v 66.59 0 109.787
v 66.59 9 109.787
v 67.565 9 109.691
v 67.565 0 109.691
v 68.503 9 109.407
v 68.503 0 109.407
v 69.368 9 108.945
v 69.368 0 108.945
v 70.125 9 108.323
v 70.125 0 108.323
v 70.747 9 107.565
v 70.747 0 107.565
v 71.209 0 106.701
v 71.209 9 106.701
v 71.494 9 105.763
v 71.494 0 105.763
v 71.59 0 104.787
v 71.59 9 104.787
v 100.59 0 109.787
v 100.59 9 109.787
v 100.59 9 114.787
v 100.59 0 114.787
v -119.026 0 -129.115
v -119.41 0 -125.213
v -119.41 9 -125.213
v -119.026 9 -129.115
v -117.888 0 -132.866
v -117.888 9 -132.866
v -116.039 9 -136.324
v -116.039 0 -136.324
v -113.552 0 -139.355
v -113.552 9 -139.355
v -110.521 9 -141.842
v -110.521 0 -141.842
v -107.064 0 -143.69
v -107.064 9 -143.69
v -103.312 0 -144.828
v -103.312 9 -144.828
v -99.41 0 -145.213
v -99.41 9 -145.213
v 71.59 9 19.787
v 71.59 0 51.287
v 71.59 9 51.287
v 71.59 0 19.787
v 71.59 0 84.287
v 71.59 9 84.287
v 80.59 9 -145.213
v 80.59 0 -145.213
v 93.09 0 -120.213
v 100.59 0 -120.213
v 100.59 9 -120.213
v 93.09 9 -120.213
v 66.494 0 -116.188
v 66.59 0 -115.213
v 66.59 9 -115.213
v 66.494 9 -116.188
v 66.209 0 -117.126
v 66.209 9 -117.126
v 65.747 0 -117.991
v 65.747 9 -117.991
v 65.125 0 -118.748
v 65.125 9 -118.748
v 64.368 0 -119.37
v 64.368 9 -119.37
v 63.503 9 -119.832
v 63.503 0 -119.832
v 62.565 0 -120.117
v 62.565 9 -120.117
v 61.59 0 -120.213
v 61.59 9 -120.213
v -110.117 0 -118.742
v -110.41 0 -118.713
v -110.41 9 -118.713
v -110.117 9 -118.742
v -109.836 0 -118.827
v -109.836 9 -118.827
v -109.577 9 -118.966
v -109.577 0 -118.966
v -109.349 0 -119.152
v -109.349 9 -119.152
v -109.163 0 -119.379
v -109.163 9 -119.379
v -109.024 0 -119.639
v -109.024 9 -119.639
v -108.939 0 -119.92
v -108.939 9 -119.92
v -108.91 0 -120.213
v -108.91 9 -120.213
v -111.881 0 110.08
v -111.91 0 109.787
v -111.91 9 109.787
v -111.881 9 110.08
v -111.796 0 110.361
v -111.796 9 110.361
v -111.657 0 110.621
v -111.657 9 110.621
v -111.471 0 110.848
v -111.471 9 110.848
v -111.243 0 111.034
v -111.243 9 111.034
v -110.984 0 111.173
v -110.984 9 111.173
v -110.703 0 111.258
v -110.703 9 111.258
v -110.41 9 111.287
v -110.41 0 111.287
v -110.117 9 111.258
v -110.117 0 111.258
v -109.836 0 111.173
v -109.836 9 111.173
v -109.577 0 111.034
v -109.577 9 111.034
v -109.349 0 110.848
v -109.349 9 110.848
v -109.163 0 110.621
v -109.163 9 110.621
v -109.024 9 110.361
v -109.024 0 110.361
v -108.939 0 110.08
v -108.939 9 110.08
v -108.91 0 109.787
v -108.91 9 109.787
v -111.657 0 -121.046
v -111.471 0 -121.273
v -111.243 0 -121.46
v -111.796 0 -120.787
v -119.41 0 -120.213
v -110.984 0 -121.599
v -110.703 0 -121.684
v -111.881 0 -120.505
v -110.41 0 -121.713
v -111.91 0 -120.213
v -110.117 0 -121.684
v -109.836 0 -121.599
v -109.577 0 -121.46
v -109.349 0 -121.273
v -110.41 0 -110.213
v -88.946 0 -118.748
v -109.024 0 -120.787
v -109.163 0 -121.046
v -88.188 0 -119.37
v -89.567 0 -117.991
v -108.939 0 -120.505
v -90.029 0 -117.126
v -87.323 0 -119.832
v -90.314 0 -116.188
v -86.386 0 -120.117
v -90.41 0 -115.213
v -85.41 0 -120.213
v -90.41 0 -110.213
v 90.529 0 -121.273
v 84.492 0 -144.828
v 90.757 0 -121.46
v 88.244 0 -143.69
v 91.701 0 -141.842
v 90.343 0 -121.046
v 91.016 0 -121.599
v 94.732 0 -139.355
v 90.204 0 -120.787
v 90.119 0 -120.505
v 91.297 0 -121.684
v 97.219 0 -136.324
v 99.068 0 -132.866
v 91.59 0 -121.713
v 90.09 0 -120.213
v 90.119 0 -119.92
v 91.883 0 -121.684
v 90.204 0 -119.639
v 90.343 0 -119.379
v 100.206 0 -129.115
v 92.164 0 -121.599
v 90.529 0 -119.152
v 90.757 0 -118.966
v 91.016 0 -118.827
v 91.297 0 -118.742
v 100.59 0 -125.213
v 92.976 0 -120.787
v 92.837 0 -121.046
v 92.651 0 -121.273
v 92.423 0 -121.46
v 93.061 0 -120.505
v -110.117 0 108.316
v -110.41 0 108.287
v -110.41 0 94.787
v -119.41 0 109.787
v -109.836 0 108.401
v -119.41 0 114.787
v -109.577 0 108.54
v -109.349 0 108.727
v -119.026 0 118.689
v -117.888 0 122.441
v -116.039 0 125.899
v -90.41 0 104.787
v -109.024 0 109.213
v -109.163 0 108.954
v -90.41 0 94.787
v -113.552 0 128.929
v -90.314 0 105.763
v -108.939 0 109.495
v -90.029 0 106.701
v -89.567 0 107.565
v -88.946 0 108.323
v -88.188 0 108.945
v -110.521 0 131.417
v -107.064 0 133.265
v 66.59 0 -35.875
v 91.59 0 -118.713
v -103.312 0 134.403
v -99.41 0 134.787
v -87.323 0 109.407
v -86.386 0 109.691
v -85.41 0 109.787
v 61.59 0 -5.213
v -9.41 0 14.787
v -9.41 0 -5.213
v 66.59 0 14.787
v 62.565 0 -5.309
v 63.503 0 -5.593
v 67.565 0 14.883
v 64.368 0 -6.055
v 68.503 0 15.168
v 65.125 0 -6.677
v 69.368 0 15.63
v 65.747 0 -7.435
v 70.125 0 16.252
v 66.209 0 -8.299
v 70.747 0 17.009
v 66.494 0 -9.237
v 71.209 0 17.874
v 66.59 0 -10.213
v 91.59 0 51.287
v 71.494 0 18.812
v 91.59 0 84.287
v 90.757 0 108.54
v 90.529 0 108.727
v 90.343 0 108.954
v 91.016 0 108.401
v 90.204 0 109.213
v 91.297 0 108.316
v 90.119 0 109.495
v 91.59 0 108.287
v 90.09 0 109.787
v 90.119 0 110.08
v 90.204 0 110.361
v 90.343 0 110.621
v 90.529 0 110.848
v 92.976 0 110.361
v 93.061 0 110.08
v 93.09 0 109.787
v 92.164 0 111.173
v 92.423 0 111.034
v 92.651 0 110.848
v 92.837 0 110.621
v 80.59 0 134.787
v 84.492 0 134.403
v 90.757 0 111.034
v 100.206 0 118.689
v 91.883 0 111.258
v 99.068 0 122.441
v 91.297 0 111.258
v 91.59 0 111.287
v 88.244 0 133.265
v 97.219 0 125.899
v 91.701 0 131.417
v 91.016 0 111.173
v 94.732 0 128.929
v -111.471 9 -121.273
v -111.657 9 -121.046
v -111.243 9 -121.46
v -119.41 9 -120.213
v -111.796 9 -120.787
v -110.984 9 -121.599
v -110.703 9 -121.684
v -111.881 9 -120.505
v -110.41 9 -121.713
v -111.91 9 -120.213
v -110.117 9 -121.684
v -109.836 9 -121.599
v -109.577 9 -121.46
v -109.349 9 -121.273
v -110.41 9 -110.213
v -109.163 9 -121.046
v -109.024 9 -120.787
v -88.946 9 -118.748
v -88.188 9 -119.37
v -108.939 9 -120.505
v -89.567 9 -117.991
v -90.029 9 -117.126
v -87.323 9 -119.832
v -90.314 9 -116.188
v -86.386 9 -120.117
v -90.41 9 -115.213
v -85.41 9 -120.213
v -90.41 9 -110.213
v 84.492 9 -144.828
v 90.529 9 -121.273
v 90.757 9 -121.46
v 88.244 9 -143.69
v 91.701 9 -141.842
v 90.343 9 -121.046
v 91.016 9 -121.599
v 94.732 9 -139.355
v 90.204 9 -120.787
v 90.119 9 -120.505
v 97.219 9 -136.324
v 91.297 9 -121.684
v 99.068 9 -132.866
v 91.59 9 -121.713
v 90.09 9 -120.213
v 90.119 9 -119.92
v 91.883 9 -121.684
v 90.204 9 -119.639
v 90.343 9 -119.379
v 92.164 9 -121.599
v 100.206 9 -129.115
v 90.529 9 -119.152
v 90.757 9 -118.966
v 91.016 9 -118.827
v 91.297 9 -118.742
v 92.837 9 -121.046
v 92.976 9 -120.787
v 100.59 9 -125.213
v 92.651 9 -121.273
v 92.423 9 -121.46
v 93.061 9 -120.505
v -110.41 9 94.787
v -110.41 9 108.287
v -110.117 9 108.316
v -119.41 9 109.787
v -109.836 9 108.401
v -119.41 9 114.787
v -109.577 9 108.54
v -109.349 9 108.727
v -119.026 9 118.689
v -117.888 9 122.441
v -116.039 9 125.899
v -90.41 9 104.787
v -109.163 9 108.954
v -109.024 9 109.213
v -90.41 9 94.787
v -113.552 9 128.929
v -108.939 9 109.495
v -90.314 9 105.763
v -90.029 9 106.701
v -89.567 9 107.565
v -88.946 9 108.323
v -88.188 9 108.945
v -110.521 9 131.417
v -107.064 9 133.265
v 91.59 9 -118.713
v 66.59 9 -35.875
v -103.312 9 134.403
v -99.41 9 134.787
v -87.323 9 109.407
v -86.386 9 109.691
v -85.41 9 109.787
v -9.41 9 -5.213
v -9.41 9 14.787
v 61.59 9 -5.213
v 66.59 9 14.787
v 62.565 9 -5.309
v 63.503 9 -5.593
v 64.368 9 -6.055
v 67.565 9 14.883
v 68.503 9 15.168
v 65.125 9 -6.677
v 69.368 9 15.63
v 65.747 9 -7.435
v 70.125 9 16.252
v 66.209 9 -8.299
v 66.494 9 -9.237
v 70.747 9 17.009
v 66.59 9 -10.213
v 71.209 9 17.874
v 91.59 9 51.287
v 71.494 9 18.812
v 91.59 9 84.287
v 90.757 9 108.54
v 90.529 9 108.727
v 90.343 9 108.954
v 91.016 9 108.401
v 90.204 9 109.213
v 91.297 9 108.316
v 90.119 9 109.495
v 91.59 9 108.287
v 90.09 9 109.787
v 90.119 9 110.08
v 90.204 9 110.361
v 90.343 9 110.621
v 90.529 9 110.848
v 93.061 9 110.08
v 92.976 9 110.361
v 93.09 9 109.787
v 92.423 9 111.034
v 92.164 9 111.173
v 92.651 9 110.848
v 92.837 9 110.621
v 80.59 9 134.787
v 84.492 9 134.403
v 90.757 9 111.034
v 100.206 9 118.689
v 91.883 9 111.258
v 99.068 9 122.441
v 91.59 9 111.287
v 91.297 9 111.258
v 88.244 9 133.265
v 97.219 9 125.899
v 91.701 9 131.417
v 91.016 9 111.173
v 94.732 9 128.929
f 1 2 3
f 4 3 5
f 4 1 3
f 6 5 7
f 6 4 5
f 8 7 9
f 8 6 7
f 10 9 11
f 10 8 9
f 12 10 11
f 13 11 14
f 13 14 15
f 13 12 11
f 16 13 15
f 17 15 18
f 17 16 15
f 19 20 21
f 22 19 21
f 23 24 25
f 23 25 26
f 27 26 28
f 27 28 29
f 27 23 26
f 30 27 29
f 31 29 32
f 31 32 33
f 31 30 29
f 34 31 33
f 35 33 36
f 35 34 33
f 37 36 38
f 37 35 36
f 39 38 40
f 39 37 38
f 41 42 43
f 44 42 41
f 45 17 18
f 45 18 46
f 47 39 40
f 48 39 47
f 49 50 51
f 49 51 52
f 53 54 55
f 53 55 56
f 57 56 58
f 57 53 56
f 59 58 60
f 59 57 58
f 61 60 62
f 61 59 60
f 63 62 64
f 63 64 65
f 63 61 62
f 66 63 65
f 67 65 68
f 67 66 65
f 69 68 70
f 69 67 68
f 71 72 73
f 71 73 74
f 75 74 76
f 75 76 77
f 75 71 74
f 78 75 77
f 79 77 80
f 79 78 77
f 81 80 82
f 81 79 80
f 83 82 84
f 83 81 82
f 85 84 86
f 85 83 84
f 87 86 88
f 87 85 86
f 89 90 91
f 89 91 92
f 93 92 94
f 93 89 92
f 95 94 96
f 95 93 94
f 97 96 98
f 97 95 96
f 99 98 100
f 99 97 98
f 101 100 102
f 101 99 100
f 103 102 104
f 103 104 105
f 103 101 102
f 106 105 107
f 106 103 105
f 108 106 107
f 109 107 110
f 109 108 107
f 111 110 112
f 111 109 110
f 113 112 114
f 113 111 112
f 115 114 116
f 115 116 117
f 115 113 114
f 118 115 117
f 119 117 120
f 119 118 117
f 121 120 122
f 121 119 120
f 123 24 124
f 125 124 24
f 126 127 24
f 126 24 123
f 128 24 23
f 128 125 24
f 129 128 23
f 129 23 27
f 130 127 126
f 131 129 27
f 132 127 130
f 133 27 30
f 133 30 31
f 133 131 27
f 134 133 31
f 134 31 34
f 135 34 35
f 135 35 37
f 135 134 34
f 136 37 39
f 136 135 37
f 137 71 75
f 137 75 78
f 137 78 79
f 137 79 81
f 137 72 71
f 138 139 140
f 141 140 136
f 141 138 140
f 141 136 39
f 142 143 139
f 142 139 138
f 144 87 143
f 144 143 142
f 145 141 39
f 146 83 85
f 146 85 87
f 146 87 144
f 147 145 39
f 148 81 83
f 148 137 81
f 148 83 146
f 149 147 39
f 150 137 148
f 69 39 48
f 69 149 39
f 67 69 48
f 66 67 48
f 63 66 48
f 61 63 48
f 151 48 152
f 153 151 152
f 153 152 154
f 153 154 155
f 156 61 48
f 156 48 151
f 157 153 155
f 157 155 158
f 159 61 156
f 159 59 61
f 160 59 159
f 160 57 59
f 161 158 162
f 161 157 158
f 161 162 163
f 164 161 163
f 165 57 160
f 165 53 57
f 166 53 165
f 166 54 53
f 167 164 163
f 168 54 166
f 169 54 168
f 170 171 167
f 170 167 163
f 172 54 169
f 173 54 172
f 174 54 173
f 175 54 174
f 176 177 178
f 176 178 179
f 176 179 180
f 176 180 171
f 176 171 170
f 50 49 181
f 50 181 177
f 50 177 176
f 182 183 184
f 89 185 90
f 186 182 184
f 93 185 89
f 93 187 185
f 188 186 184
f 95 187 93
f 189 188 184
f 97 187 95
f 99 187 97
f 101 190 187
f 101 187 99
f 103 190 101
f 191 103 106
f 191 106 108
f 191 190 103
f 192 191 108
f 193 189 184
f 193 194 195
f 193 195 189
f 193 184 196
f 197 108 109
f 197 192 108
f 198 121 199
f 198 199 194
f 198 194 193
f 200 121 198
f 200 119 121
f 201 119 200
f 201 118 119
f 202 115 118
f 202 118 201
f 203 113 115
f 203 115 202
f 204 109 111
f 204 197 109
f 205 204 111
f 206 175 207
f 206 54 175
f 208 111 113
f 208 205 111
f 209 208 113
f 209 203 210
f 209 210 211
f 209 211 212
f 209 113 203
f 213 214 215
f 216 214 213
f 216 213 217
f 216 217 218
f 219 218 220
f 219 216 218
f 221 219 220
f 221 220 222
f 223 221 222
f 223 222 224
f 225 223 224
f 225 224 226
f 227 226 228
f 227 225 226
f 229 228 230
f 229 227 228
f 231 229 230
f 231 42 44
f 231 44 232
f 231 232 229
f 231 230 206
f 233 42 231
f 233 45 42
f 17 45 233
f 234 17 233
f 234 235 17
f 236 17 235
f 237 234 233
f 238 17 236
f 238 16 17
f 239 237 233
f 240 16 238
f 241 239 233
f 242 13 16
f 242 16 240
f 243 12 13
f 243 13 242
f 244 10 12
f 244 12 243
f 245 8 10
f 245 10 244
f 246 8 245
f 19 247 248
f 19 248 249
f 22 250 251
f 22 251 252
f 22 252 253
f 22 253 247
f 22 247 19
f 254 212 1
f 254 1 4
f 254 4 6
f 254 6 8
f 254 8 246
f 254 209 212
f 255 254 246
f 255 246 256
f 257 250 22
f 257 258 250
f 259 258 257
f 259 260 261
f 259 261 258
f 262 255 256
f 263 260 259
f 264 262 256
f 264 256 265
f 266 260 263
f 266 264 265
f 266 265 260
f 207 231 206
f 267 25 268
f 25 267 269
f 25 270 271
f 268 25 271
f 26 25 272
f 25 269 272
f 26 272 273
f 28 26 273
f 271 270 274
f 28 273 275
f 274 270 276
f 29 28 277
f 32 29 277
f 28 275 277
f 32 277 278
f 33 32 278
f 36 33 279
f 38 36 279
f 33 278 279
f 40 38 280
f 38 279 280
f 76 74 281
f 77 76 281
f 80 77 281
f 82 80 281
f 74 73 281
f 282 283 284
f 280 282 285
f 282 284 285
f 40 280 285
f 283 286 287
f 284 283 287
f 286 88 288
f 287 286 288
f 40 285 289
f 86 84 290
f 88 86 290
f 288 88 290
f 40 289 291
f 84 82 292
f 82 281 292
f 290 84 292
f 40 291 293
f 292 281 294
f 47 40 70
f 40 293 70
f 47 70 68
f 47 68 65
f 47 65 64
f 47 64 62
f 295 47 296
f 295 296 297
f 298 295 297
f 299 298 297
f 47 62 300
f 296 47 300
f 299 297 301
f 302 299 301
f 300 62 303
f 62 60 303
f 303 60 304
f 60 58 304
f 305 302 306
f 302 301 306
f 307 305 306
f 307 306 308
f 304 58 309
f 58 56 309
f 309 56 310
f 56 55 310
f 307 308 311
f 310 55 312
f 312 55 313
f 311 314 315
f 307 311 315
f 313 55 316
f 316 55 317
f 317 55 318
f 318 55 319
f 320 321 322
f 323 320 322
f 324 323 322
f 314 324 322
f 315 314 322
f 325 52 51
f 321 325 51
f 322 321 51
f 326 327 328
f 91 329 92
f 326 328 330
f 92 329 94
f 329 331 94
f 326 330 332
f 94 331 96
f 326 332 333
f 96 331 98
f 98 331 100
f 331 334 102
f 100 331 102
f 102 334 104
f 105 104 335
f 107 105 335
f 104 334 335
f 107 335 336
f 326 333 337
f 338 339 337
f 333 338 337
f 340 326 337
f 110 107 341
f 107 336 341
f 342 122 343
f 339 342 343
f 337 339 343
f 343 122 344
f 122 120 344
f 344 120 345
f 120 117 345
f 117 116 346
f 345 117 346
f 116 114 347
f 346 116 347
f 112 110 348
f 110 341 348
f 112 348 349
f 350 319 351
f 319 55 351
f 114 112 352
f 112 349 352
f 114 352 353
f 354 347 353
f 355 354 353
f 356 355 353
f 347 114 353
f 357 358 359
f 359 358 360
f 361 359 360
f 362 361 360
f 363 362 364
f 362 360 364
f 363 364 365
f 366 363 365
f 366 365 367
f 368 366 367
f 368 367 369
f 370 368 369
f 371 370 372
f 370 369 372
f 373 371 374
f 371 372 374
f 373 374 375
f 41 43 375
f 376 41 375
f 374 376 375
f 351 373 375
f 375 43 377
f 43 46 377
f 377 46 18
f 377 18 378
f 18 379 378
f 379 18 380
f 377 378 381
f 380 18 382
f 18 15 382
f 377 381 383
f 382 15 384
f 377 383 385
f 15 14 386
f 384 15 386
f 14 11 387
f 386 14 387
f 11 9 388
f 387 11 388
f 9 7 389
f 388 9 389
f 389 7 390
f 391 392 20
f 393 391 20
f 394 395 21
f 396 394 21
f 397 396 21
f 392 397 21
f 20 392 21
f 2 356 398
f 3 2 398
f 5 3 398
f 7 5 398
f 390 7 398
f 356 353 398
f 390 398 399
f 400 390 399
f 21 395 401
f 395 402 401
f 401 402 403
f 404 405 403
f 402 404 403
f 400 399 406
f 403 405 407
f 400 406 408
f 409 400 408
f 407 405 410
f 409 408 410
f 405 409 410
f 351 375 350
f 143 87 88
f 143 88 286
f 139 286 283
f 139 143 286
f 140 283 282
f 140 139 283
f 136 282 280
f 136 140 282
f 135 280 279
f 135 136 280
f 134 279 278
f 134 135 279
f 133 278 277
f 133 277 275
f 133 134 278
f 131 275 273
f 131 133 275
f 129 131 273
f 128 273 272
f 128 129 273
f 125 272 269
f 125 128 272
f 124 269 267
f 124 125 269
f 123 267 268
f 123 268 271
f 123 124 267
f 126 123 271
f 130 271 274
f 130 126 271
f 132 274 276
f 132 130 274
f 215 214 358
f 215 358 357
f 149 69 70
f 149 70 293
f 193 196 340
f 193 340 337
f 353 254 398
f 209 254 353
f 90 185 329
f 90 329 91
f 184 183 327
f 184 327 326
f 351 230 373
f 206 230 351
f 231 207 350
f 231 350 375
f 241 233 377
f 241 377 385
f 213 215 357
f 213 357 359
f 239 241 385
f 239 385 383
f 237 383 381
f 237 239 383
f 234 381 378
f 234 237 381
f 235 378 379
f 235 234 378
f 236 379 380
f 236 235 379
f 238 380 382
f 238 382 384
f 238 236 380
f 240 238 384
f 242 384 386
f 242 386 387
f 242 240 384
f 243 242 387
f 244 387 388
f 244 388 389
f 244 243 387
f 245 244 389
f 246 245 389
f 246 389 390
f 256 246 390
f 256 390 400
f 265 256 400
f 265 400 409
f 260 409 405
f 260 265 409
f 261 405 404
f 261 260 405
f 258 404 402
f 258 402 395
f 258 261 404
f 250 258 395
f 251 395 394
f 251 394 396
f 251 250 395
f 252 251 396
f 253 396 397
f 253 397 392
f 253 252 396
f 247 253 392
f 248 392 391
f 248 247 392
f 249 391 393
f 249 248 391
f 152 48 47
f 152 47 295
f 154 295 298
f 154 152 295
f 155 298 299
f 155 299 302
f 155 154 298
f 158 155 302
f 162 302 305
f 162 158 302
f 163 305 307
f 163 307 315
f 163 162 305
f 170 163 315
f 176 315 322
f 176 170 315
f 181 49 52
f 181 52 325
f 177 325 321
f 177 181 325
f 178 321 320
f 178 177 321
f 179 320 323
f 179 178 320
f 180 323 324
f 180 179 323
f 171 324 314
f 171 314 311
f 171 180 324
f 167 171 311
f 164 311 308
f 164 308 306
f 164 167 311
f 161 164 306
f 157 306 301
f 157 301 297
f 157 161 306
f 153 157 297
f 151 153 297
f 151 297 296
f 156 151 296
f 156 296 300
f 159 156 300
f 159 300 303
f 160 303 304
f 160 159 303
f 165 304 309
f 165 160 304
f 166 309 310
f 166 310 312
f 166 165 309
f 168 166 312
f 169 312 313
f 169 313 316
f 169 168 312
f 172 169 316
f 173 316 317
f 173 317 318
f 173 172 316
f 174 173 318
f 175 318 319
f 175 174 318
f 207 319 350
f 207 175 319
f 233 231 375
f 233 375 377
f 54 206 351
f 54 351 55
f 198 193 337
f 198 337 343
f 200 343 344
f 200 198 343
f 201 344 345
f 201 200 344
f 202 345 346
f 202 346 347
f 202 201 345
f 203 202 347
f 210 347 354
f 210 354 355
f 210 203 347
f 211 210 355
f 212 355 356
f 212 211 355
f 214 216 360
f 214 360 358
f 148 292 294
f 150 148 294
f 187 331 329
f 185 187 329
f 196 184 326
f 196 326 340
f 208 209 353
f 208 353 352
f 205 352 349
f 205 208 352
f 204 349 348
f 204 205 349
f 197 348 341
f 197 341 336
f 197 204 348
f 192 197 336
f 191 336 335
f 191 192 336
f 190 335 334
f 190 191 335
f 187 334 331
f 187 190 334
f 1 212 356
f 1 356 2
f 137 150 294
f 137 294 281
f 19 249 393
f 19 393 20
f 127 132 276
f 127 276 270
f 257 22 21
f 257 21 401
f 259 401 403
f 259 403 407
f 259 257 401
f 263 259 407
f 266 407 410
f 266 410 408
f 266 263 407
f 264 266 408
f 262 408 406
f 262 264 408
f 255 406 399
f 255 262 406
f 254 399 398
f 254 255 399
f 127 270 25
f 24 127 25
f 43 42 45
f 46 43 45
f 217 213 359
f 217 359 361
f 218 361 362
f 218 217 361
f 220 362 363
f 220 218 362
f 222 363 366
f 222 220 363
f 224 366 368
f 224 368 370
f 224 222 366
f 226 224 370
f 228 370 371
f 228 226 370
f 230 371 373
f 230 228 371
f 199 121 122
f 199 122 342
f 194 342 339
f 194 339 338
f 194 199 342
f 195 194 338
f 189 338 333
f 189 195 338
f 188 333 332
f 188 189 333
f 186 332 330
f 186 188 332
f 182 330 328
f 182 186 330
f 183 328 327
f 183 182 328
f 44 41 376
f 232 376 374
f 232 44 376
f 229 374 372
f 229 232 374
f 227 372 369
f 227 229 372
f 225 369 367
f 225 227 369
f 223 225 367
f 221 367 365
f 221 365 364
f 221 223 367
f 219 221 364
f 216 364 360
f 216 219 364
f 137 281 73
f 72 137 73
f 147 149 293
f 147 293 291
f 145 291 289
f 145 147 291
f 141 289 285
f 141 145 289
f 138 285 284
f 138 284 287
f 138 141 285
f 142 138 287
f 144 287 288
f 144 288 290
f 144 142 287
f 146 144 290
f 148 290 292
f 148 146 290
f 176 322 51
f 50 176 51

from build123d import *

# Parameters (mm, degrees)
F0_W     = 19.999999
F0_H     = 33
F0_W_2   = 15
F0_H_2   = 45
F1_DEPTH = 9


with BuildPart() as f1:
    # F0 (on Front) → F1 (new body)
    with BuildSketch(Plane.XZ):
        with BuildLine():
            Line((80.58994, 134.787209), (-99.41006, 134.787209))
            ThreePointArc((-99.41006, 134.787209), (-113.552195, 128.929344), (-119.41006, 114.787209))
            Line((-119.41006, 114.787209), (-119.41006, 109.787209))
            Line((-119.41006, 109.787209), (-111.91006, 109.787209))
            ThreePointArc((-111.91006, 109.787209), (-110.41006, 111.287209), (-108.91006, 109.787209))
            ThreePointArc((-108.91006, 109.787209), (-109.349399, 108.726549), (-110.41006, 108.287209))
            Line((-110.41006, 108.287209), (-110.41006, 94.787209))
            Line((-110.41006, 94.787209), (-90.41006, 94.787209))
            Line((-90.41006, 94.787209), (-90.41006, 104.787209))
            ThreePointArc((-90.41006, 104.787209), (-88.945593, 108.322743), (-85.41006, 109.787209))
            Line((-85.41006, 109.787209), (66.589941, 109.787209))
            ThreePointArc((66.589941, 109.787209), (70.125475, 108.322743), (71.589941, 104.787209))
            Line((71.589941, 104.787209), (71.589941, 84.287209))
            Line((71.589941, 84.287209), (91.58994, 84.287209))
            Line((91.58994, 84.287209), (91.58994, 108.287209))
            ThreePointArc((91.58994, 108.287209), (90.52928, 110.847869), (93.08994, 109.787209))
            Line((93.08994, 109.787209), (100.58994, 109.787209))
            Line((100.58994, 109.787209), (100.58994, 114.787209))
            ThreePointArc((100.58994, 114.787209), (94.732076, 128.929344), (80.58994, 134.787209))
        make_face()
        with BuildLine():
            Line((91.58994, -15.212791), (91.58994, 51.287209))
            Line((91.58994, 51.287209), (71.589941, 51.287209))
            Line((71.589941, 51.287209), (71.589941, 19.787209))
            ThreePointArc((71.589941, 19.787209), (70.125475, 16.251675), (66.589941, 14.787209))
            Line((66.589941, 14.787209), (-9.410059, 14.787209))
            Line((-9.410059, 14.787209), (-9.41006, -5.212791))
            Line((-9.41006, -5.212791), (61.589941, -5.212791))
            ThreePointArc((61.589941, -5.212791), (65.125475, -6.677257), (66.589941, -10.212791))
            Line((66.589941, -10.212791), (66.58994, -35.874643))
            Line((66.58994, -35.874643), (66.589941, -115.212791))
            ThreePointArc((66.589941, -115.212791), (65.125475, -118.748325), (61.589941, -120.212791))
            Line((61.589941, -120.212791), (-85.41006, -120.212791))
            ThreePointArc((-85.41006, -120.212791), (-88.945593, -118.748325), (-90.41006, -115.212791))
            Line((-90.41006, -115.212791), (-90.41006, -110.212791))
            Line((-90.41006, -110.212791), (-110.41006, -110.212791))
            Line((-110.41006, -110.212791), (-110.41006, -118.712791))
            ThreePointArc((-110.41006, -118.712791), (-109.349399, -119.152131), (-108.91006, -120.212791))
            ThreePointArc((-108.91006, -120.212791), (-110.41006, -121.712791), (-111.91006, -120.212791))
            Line((-111.91006, -120.212791), (-119.41006, -120.212791))
            Line((-119.41006, -120.212791), (-119.41006, -125.212791))
            ThreePointArc((-119.41006, -125.212791), (-113.552195, -139.354927), (-99.41006, -145.212791))
            Line((-99.41006, -145.212791), (80.58994, -145.212791))
            ThreePointArc((80.58994, -145.212791), (94.732076, -139.354927), (100.58994, -125.212791))
            Line((100.58994, -125.212791), (100.58994, -120.212791))
            Line((100.58994, -120.212791), (93.08994, -120.212791))
            ThreePointArc((93.08994, -120.212791), (90.52928, -121.273451), (91.58994, -118.712791))
            Line((91.58994, -118.712791), (91.58994, -110.212791))
            Line((91.58994, -110.212791), (91.58994, -60.212791))
            Line((91.58994, -60.212791), (76.58994, -60.212791))
            Line((76.58994, -60.212791), (76.58994, -15.212791))
            Line((76.58994, -15.212791), (91.58994, -15.212791))
        make_face()
        with Locations((81.58994, 67.787209)):
            Rectangle(F0_W, F0_H)
        with Locations((84.08994, -37.712791)):
            Rectangle(F0_W_2, F0_H_2)
    extrude(amount=-F1_DEPTH)


solid = f1.part
